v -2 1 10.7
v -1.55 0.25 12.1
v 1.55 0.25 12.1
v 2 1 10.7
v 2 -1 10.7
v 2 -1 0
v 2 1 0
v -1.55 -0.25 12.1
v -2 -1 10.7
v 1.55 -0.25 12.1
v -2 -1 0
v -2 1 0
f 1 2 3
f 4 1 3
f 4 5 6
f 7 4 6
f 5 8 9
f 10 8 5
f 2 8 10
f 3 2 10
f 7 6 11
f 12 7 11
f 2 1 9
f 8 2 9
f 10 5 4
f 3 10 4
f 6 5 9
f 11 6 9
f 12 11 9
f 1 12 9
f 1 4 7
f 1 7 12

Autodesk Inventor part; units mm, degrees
ref_plane "YZ Plane" through (0, 0, 0) normal (1, 0, 0) x (0, 1, 0)
ref_plane "XZ Plane" through (0, 0, 0) normal (0, 1, 0) x (-1, 0, 0)
ref_plane "XY Plane" through (0, 0, 0) normal (0, 0, 1) x (1, 0, 0)
sketch "Sketch1" plane through (0, 0, 0) normal (0, 1, 0) x (-1, 0, 0)
  line L0 (-2, 0) -> (2, 0)
  line L1 (2, 0) -> (2, 12.1)
  line L2 (2, 12.1) -> (-2, 12.1)
  line L3 (-2, 12.1) -> (-2, 0)
  point P0 (0, 0)
  point P1 (0, 0)
  dimension "d0" = 4
  dimension "d1" = 12.1
extrude "Extrusion1" add sketch "Sketch1" along normal mid plane 2
chamfer "Chamfer1" distance 1.4 distance2 0.45 1 edges at (-2, 0, 12.1) measured on face at (-2, 0.3333, 8.0667)
chamfer "Chamfer2" distance 1.4 distance2 0.45 1 edges at (2, 0, 12.1) measured on face at (2, -0.3333, 8.0667)
chamfer "Chamfer3" distance 1.4 distance2 0.75 1 edges at (0, 1, 12.1) measured on face at (0.6667, 1, 7.1333)
chamfer "Chamfer4" distance 1.4 distance2 0.75 1 edges at (0, -1, 12.1) measured on face at (0.6667, -1, 7.1333)
properties material "Nickel-Copper Alloy 400"
